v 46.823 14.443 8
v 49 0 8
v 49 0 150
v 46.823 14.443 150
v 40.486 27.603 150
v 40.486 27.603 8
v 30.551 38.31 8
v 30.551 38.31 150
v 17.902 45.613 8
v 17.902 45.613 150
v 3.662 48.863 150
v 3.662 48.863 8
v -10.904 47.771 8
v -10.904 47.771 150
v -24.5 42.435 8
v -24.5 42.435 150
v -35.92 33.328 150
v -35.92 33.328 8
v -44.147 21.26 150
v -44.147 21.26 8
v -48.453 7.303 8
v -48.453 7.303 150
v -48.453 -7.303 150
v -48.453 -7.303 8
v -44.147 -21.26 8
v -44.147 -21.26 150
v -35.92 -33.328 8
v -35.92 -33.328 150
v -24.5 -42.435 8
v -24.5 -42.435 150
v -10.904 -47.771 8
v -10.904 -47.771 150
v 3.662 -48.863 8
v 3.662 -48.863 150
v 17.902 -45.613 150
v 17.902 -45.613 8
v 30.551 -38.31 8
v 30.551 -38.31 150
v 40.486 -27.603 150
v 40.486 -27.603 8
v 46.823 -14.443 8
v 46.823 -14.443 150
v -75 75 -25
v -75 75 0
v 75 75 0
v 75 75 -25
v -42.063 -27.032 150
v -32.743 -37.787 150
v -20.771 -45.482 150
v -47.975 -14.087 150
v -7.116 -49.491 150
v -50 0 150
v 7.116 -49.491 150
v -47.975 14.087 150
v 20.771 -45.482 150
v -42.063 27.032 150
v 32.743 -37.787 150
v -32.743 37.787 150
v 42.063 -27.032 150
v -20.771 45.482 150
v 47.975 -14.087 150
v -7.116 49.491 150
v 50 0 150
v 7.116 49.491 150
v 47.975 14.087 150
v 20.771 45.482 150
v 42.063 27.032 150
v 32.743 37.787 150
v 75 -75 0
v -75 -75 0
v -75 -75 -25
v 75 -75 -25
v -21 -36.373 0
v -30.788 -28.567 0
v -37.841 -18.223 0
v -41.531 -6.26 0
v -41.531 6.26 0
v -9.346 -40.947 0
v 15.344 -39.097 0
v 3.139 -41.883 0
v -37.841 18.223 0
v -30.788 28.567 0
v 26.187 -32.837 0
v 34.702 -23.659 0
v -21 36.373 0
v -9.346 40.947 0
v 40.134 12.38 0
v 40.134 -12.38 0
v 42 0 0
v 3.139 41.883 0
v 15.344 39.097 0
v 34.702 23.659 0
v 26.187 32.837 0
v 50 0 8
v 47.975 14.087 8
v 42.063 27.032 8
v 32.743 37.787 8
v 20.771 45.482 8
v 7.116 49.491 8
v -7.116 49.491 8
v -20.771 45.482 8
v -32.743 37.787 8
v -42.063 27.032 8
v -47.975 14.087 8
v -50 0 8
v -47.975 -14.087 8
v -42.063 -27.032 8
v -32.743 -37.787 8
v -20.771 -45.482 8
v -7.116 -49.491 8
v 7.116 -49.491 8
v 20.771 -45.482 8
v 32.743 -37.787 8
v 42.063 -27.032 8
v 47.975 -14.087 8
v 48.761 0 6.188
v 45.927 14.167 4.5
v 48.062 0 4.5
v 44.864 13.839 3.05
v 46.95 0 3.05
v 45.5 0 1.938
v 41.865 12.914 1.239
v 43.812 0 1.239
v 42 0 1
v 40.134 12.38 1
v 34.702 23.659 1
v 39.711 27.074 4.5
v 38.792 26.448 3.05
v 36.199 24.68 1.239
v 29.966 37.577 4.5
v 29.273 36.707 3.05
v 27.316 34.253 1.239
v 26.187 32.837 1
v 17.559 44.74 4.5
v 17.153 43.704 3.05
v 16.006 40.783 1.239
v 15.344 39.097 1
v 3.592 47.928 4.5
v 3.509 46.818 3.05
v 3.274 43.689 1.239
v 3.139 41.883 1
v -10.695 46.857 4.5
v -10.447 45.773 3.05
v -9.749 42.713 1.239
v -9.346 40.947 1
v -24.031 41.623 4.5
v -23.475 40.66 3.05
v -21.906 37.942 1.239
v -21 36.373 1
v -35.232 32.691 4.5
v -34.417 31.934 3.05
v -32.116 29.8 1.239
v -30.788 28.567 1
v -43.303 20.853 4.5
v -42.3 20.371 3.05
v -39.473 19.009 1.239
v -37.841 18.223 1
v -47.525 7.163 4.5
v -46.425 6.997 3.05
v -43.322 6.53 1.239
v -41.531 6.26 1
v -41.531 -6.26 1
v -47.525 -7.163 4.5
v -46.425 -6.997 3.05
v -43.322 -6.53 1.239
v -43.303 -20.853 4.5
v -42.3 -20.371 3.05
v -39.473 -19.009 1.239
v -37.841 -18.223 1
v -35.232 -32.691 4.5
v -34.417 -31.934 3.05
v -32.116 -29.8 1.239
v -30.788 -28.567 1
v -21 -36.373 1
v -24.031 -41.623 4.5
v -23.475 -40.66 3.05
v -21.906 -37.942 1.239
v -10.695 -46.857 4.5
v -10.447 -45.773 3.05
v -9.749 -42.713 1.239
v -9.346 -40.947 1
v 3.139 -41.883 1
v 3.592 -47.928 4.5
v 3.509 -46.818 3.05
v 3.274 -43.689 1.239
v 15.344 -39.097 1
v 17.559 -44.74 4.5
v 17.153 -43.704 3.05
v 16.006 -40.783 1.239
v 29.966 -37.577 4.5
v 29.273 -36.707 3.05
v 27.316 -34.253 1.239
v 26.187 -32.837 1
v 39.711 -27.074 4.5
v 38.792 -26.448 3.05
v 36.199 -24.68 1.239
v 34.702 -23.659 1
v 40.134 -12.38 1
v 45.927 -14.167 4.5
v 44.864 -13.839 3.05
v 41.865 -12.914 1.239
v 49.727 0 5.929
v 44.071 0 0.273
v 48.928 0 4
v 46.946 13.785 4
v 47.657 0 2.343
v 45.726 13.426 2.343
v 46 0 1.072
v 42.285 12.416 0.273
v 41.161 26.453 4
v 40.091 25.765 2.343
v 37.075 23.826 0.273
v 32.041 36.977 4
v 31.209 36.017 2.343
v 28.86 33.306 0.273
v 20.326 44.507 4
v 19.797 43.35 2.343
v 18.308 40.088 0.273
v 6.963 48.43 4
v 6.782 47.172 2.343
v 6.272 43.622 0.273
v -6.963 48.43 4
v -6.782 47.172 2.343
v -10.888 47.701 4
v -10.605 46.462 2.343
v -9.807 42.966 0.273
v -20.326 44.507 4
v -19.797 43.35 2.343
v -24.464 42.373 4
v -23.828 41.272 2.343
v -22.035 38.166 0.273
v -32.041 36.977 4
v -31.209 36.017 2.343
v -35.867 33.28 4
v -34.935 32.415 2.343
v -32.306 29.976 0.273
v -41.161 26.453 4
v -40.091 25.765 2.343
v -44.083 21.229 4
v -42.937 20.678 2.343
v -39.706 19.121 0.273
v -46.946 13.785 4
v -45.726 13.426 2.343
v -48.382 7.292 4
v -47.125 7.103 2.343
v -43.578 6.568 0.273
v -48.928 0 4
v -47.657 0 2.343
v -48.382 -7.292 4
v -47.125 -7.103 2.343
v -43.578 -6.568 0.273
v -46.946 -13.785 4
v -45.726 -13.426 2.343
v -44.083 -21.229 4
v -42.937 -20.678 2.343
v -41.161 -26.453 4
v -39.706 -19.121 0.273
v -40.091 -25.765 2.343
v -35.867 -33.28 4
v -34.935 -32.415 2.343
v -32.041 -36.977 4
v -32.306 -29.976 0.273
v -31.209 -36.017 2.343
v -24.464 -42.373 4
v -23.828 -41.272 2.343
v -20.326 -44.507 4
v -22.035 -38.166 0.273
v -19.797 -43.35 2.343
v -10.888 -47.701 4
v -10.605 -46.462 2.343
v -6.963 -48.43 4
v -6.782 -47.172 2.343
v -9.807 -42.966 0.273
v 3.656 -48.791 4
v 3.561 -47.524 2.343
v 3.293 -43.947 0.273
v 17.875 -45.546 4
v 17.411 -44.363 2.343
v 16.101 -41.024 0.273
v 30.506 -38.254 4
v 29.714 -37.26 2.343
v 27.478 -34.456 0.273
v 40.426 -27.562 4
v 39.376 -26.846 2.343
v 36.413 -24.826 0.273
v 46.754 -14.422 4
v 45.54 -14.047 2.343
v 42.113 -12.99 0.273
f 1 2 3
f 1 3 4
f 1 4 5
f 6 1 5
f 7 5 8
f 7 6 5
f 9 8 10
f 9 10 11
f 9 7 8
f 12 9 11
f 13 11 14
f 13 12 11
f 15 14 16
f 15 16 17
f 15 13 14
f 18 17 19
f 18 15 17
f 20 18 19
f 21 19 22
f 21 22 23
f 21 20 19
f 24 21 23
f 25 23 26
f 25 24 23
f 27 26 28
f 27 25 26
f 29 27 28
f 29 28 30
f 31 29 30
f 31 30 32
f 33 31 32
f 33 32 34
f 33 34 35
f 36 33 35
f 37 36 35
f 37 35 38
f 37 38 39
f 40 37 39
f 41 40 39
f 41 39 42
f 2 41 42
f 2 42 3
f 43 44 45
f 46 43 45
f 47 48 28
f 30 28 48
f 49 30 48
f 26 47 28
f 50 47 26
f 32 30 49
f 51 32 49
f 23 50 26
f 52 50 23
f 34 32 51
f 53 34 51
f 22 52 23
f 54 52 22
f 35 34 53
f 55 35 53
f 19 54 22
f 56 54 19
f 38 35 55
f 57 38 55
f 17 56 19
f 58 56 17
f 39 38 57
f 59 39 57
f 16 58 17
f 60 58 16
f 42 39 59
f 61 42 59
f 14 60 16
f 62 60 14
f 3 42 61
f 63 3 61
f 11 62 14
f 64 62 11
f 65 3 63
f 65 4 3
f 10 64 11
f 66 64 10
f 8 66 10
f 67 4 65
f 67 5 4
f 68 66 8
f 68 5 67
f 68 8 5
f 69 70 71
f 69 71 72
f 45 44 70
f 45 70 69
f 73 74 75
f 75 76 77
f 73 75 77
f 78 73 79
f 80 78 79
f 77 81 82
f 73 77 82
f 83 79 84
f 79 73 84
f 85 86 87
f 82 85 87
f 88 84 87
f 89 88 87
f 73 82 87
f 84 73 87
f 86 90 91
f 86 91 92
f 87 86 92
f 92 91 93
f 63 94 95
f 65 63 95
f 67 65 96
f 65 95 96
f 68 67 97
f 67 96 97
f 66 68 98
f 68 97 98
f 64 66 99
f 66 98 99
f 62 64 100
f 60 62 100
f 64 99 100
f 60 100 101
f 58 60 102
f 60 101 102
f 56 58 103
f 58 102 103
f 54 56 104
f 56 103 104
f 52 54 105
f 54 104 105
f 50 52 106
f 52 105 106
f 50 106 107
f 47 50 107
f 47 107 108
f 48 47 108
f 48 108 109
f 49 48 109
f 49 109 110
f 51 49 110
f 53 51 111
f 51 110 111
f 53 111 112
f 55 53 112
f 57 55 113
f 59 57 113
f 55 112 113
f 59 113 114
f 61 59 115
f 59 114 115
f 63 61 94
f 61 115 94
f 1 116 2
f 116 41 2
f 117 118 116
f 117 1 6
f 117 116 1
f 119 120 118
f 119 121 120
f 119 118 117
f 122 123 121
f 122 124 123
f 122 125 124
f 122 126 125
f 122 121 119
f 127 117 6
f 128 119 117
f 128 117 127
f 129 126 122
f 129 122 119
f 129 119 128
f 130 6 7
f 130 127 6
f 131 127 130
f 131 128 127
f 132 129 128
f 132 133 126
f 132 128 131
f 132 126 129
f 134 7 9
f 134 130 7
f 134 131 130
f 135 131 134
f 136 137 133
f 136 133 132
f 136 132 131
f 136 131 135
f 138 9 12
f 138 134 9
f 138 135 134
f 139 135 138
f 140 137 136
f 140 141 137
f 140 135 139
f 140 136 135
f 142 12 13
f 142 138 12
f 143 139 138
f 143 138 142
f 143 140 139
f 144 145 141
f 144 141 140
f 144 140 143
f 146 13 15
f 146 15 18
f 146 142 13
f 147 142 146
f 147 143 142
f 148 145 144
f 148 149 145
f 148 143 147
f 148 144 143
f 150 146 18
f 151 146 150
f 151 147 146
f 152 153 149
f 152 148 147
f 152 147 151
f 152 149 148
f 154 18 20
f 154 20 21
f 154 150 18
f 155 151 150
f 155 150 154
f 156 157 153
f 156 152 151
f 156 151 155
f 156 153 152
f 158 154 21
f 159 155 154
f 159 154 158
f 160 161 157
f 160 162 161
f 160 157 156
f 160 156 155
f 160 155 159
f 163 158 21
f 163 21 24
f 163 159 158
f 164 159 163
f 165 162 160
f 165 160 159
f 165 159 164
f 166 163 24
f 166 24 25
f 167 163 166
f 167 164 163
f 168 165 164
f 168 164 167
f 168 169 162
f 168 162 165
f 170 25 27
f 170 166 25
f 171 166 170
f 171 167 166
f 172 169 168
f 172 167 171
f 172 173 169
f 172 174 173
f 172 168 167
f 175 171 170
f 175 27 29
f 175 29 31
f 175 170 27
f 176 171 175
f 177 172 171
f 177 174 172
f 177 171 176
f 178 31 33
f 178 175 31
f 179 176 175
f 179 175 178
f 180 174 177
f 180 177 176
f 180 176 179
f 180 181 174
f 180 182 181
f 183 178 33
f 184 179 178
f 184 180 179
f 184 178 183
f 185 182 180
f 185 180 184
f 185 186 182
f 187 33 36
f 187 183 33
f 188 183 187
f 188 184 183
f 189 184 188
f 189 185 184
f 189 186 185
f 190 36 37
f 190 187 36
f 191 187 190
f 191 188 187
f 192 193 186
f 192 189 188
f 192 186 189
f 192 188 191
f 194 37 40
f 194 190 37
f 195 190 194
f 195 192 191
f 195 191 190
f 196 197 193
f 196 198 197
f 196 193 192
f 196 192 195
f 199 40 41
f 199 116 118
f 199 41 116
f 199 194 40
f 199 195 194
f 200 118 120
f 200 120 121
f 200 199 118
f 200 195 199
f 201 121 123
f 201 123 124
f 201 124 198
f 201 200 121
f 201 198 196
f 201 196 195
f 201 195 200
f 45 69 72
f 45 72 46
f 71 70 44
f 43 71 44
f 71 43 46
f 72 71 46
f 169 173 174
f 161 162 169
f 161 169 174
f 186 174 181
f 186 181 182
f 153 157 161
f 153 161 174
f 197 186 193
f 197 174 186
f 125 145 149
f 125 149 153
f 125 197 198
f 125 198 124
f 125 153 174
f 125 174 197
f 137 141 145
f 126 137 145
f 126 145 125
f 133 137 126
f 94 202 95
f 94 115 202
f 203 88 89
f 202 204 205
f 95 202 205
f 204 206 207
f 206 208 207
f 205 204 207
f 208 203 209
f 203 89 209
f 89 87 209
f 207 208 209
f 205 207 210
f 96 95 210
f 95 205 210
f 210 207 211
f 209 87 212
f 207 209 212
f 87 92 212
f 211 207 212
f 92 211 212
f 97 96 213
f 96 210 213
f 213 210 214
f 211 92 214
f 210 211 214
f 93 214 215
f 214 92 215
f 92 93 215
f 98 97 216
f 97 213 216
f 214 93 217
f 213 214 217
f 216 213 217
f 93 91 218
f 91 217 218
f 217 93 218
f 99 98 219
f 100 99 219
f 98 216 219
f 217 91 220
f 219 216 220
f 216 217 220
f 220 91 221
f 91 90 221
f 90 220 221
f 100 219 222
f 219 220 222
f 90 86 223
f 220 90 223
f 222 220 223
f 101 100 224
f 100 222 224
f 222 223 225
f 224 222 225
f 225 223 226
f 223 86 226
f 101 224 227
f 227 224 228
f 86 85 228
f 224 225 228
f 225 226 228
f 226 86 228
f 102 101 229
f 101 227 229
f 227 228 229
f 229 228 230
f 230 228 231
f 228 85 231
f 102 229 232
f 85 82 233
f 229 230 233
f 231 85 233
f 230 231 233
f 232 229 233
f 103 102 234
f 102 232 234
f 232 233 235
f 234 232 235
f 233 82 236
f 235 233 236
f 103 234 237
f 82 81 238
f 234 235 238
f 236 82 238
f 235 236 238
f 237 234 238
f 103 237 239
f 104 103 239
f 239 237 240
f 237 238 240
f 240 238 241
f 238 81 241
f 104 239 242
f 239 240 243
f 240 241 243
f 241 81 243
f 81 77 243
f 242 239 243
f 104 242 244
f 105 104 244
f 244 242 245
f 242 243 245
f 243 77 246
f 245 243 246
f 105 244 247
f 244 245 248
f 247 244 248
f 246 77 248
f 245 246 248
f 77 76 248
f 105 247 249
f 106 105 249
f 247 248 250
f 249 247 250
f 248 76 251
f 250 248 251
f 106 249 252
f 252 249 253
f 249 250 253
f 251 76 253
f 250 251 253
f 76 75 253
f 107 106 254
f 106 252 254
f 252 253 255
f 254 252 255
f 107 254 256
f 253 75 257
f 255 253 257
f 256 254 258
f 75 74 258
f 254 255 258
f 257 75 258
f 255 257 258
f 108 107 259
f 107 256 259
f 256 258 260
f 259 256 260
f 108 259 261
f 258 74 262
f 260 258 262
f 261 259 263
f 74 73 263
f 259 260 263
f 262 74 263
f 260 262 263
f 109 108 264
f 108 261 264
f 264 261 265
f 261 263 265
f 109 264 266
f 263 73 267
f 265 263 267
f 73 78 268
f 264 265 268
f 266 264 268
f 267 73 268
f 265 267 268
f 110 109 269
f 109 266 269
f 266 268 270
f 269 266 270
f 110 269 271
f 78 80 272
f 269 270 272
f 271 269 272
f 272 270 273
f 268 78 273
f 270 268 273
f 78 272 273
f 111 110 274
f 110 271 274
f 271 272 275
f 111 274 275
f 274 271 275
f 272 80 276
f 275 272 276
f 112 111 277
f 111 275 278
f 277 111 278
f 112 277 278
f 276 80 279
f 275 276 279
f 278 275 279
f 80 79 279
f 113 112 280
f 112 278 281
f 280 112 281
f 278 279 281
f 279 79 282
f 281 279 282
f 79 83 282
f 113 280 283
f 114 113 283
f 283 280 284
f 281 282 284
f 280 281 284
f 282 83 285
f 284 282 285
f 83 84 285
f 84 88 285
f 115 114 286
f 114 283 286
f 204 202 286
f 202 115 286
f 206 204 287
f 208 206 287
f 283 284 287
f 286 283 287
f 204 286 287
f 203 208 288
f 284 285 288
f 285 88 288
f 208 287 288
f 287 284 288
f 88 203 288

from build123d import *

# Parameters (mm, degrees)
F0_R     = 50
F1_DEPTH = 150
F2_R     = 8
F3_T     = -1
F4_W     = 150
F4_H     = 150
F5_DEPTH = 25


with BuildPart() as f1:
    # F0 (on Top) → F1 (new body)
    with BuildSketch(Plane.XY):
        Circle(F0_R)
    extrude(amount=F1_DEPTH)

    # F2
    f2_edges = [f1.edges().sort_by_distance(p)[0] for p in [
        (-50, 0, 0),
    ]]
    fillet(f2_edges, radius=F2_R)

    # F3
    f3_openings = [f1.faces().sort_by_distance(p)[0] for p in [
        (0, 0, 150),
    ]]
    offset(amount=F3_T, openings=f3_openings)


with BuildPart() as f5:
    # F4 (on Top) → F5 (new body)
    with BuildSketch(Plane.XY):
        Rectangle(F4_W, F4_H)
    extrude(amount=-F5_DEPTH)


solid = Compound([f1.part, f5.part])
